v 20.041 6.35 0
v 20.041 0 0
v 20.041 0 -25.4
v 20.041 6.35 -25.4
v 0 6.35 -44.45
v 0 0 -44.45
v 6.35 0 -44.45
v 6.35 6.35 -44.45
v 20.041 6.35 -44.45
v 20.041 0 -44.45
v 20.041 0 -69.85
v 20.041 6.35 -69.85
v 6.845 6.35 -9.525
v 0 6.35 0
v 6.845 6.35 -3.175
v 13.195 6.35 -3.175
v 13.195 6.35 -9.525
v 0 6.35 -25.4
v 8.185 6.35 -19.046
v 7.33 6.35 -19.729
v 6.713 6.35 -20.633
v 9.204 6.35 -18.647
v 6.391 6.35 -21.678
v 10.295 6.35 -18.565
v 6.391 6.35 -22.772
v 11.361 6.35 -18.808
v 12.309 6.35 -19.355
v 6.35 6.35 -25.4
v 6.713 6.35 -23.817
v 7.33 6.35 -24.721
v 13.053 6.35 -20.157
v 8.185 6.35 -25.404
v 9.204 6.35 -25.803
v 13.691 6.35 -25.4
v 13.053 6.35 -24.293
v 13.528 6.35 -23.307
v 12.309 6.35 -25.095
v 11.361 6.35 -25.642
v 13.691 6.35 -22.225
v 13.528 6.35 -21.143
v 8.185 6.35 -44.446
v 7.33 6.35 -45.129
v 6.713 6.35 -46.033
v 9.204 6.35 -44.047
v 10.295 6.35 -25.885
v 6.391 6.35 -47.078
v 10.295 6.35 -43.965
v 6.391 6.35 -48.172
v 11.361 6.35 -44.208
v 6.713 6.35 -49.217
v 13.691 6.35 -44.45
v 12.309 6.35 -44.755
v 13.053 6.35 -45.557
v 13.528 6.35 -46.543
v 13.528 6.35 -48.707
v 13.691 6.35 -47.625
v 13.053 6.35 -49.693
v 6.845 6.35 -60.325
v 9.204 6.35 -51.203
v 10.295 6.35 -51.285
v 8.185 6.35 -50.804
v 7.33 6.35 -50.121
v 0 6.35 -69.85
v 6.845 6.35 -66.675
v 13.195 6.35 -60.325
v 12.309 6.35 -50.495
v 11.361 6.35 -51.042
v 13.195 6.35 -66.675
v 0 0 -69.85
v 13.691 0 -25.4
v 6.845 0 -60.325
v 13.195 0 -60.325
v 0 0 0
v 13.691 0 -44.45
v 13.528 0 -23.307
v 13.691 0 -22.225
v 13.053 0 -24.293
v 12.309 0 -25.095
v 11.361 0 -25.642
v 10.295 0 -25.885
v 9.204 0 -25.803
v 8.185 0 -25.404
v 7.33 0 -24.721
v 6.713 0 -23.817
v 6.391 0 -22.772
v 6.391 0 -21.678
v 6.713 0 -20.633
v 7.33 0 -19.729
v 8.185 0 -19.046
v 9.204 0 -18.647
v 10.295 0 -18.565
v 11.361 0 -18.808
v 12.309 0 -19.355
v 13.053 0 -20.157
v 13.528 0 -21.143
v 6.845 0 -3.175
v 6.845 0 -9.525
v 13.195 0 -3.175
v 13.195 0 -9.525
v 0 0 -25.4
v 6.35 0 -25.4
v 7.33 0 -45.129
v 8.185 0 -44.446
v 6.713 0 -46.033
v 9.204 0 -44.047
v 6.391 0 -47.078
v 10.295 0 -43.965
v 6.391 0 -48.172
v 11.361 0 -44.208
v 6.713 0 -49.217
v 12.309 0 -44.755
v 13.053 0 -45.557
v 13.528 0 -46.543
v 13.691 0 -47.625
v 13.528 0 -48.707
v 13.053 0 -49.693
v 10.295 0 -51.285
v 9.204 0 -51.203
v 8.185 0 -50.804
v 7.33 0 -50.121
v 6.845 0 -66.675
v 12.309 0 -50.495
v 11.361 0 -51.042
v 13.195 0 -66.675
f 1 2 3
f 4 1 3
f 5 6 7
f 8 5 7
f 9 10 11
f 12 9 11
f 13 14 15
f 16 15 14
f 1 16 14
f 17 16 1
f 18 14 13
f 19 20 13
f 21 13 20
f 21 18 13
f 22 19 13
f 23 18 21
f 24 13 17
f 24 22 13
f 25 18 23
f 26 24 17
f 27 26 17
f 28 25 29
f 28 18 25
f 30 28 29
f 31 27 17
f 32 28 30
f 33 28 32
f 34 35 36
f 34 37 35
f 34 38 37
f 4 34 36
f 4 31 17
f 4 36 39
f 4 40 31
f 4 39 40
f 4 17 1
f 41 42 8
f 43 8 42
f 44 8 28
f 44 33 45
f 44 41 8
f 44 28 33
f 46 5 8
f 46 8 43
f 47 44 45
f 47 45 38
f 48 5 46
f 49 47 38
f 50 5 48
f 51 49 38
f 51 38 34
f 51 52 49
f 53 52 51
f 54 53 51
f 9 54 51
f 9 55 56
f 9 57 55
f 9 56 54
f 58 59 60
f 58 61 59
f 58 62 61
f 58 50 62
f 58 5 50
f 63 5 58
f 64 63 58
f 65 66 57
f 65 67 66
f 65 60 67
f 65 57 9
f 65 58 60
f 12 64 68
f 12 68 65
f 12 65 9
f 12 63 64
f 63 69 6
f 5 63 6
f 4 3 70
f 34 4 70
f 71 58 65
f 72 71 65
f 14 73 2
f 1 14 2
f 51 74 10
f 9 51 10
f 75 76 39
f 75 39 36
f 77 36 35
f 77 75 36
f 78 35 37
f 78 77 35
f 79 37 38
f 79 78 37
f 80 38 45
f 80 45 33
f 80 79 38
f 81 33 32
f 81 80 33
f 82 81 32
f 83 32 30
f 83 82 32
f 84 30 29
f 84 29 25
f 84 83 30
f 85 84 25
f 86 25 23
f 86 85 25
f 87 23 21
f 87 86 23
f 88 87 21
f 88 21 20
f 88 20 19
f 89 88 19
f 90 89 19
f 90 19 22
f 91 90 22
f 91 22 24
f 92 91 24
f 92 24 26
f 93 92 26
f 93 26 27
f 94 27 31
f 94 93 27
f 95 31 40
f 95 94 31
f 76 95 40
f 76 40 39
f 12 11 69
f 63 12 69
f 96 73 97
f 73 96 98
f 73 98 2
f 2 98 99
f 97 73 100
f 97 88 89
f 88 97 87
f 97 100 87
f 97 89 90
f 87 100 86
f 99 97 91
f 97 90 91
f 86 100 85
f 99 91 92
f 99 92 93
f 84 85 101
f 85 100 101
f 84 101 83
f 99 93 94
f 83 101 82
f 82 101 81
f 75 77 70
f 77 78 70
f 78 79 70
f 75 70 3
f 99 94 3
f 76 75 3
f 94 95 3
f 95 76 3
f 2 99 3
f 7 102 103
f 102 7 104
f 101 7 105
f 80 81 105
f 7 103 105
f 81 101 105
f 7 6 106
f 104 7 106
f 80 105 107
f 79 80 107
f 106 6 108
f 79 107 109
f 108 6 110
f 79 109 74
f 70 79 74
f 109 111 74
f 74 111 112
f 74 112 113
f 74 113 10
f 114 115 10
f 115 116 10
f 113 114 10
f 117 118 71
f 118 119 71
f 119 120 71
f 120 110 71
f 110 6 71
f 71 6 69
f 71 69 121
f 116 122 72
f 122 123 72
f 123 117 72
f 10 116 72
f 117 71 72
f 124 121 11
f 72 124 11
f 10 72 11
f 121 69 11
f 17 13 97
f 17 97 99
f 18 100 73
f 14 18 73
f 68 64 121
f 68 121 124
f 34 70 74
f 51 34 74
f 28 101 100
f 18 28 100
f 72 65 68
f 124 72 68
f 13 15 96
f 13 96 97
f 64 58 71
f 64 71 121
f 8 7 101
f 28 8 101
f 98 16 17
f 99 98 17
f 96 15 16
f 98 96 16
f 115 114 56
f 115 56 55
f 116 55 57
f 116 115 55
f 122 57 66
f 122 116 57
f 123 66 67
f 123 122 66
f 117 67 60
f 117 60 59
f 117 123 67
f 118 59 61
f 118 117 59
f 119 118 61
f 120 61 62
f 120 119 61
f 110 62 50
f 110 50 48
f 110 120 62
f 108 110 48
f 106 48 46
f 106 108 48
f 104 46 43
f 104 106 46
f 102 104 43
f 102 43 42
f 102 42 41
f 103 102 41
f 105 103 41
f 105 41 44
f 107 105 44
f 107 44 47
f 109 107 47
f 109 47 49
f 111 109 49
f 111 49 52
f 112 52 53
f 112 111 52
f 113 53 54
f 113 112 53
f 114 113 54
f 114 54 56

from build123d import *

# Parameters (mm, degrees)
SKETCH1_W           = 6.35
SKETCH1_H           = 6.35
SKETCH1_R           = 3.6703
BOSS_EXTRUDE1_DEPTH = 6.35


with BuildPart() as part:
    # Sketch1 → Boss-Extrude1 (new body)
    with BuildSketch(Plane(origin=(0, 0, 0), x_dir=(1, 0, 0), z_dir=(0, 1, 0))):
        Polygon((0, 25.4), (0, 0), (20.0406, 0), (20.0406, 25.4), (13.6906, 25.4), (13.6906, 44.45), (20.0406, 44.45), (20.0406, 69.85), (0, 69.85), (0, 44.45), (6.35, 44.45), (6.35, 25.4), align=None)
        with Locations((10.0203, 6.35)):
            Rectangle(SKETCH1_W, SKETCH1_H, mode=Mode.SUBTRACT)
        with Locations((10.0203, 22.225)):
            Circle(SKETCH1_R, mode=Mode.SUBTRACT)
        with Locations((10.0203, 63.5)):
            Rectangle(SKETCH1_W, SKETCH1_H, mode=Mode.SUBTRACT)
        with Locations((10.0203, 47.625)):
            Circle(SKETCH1_R, mode=Mode.SUBTRACT)
    extrude(amount=BOSS_EXTRUDE1_DEPTH)


solid = part.part
